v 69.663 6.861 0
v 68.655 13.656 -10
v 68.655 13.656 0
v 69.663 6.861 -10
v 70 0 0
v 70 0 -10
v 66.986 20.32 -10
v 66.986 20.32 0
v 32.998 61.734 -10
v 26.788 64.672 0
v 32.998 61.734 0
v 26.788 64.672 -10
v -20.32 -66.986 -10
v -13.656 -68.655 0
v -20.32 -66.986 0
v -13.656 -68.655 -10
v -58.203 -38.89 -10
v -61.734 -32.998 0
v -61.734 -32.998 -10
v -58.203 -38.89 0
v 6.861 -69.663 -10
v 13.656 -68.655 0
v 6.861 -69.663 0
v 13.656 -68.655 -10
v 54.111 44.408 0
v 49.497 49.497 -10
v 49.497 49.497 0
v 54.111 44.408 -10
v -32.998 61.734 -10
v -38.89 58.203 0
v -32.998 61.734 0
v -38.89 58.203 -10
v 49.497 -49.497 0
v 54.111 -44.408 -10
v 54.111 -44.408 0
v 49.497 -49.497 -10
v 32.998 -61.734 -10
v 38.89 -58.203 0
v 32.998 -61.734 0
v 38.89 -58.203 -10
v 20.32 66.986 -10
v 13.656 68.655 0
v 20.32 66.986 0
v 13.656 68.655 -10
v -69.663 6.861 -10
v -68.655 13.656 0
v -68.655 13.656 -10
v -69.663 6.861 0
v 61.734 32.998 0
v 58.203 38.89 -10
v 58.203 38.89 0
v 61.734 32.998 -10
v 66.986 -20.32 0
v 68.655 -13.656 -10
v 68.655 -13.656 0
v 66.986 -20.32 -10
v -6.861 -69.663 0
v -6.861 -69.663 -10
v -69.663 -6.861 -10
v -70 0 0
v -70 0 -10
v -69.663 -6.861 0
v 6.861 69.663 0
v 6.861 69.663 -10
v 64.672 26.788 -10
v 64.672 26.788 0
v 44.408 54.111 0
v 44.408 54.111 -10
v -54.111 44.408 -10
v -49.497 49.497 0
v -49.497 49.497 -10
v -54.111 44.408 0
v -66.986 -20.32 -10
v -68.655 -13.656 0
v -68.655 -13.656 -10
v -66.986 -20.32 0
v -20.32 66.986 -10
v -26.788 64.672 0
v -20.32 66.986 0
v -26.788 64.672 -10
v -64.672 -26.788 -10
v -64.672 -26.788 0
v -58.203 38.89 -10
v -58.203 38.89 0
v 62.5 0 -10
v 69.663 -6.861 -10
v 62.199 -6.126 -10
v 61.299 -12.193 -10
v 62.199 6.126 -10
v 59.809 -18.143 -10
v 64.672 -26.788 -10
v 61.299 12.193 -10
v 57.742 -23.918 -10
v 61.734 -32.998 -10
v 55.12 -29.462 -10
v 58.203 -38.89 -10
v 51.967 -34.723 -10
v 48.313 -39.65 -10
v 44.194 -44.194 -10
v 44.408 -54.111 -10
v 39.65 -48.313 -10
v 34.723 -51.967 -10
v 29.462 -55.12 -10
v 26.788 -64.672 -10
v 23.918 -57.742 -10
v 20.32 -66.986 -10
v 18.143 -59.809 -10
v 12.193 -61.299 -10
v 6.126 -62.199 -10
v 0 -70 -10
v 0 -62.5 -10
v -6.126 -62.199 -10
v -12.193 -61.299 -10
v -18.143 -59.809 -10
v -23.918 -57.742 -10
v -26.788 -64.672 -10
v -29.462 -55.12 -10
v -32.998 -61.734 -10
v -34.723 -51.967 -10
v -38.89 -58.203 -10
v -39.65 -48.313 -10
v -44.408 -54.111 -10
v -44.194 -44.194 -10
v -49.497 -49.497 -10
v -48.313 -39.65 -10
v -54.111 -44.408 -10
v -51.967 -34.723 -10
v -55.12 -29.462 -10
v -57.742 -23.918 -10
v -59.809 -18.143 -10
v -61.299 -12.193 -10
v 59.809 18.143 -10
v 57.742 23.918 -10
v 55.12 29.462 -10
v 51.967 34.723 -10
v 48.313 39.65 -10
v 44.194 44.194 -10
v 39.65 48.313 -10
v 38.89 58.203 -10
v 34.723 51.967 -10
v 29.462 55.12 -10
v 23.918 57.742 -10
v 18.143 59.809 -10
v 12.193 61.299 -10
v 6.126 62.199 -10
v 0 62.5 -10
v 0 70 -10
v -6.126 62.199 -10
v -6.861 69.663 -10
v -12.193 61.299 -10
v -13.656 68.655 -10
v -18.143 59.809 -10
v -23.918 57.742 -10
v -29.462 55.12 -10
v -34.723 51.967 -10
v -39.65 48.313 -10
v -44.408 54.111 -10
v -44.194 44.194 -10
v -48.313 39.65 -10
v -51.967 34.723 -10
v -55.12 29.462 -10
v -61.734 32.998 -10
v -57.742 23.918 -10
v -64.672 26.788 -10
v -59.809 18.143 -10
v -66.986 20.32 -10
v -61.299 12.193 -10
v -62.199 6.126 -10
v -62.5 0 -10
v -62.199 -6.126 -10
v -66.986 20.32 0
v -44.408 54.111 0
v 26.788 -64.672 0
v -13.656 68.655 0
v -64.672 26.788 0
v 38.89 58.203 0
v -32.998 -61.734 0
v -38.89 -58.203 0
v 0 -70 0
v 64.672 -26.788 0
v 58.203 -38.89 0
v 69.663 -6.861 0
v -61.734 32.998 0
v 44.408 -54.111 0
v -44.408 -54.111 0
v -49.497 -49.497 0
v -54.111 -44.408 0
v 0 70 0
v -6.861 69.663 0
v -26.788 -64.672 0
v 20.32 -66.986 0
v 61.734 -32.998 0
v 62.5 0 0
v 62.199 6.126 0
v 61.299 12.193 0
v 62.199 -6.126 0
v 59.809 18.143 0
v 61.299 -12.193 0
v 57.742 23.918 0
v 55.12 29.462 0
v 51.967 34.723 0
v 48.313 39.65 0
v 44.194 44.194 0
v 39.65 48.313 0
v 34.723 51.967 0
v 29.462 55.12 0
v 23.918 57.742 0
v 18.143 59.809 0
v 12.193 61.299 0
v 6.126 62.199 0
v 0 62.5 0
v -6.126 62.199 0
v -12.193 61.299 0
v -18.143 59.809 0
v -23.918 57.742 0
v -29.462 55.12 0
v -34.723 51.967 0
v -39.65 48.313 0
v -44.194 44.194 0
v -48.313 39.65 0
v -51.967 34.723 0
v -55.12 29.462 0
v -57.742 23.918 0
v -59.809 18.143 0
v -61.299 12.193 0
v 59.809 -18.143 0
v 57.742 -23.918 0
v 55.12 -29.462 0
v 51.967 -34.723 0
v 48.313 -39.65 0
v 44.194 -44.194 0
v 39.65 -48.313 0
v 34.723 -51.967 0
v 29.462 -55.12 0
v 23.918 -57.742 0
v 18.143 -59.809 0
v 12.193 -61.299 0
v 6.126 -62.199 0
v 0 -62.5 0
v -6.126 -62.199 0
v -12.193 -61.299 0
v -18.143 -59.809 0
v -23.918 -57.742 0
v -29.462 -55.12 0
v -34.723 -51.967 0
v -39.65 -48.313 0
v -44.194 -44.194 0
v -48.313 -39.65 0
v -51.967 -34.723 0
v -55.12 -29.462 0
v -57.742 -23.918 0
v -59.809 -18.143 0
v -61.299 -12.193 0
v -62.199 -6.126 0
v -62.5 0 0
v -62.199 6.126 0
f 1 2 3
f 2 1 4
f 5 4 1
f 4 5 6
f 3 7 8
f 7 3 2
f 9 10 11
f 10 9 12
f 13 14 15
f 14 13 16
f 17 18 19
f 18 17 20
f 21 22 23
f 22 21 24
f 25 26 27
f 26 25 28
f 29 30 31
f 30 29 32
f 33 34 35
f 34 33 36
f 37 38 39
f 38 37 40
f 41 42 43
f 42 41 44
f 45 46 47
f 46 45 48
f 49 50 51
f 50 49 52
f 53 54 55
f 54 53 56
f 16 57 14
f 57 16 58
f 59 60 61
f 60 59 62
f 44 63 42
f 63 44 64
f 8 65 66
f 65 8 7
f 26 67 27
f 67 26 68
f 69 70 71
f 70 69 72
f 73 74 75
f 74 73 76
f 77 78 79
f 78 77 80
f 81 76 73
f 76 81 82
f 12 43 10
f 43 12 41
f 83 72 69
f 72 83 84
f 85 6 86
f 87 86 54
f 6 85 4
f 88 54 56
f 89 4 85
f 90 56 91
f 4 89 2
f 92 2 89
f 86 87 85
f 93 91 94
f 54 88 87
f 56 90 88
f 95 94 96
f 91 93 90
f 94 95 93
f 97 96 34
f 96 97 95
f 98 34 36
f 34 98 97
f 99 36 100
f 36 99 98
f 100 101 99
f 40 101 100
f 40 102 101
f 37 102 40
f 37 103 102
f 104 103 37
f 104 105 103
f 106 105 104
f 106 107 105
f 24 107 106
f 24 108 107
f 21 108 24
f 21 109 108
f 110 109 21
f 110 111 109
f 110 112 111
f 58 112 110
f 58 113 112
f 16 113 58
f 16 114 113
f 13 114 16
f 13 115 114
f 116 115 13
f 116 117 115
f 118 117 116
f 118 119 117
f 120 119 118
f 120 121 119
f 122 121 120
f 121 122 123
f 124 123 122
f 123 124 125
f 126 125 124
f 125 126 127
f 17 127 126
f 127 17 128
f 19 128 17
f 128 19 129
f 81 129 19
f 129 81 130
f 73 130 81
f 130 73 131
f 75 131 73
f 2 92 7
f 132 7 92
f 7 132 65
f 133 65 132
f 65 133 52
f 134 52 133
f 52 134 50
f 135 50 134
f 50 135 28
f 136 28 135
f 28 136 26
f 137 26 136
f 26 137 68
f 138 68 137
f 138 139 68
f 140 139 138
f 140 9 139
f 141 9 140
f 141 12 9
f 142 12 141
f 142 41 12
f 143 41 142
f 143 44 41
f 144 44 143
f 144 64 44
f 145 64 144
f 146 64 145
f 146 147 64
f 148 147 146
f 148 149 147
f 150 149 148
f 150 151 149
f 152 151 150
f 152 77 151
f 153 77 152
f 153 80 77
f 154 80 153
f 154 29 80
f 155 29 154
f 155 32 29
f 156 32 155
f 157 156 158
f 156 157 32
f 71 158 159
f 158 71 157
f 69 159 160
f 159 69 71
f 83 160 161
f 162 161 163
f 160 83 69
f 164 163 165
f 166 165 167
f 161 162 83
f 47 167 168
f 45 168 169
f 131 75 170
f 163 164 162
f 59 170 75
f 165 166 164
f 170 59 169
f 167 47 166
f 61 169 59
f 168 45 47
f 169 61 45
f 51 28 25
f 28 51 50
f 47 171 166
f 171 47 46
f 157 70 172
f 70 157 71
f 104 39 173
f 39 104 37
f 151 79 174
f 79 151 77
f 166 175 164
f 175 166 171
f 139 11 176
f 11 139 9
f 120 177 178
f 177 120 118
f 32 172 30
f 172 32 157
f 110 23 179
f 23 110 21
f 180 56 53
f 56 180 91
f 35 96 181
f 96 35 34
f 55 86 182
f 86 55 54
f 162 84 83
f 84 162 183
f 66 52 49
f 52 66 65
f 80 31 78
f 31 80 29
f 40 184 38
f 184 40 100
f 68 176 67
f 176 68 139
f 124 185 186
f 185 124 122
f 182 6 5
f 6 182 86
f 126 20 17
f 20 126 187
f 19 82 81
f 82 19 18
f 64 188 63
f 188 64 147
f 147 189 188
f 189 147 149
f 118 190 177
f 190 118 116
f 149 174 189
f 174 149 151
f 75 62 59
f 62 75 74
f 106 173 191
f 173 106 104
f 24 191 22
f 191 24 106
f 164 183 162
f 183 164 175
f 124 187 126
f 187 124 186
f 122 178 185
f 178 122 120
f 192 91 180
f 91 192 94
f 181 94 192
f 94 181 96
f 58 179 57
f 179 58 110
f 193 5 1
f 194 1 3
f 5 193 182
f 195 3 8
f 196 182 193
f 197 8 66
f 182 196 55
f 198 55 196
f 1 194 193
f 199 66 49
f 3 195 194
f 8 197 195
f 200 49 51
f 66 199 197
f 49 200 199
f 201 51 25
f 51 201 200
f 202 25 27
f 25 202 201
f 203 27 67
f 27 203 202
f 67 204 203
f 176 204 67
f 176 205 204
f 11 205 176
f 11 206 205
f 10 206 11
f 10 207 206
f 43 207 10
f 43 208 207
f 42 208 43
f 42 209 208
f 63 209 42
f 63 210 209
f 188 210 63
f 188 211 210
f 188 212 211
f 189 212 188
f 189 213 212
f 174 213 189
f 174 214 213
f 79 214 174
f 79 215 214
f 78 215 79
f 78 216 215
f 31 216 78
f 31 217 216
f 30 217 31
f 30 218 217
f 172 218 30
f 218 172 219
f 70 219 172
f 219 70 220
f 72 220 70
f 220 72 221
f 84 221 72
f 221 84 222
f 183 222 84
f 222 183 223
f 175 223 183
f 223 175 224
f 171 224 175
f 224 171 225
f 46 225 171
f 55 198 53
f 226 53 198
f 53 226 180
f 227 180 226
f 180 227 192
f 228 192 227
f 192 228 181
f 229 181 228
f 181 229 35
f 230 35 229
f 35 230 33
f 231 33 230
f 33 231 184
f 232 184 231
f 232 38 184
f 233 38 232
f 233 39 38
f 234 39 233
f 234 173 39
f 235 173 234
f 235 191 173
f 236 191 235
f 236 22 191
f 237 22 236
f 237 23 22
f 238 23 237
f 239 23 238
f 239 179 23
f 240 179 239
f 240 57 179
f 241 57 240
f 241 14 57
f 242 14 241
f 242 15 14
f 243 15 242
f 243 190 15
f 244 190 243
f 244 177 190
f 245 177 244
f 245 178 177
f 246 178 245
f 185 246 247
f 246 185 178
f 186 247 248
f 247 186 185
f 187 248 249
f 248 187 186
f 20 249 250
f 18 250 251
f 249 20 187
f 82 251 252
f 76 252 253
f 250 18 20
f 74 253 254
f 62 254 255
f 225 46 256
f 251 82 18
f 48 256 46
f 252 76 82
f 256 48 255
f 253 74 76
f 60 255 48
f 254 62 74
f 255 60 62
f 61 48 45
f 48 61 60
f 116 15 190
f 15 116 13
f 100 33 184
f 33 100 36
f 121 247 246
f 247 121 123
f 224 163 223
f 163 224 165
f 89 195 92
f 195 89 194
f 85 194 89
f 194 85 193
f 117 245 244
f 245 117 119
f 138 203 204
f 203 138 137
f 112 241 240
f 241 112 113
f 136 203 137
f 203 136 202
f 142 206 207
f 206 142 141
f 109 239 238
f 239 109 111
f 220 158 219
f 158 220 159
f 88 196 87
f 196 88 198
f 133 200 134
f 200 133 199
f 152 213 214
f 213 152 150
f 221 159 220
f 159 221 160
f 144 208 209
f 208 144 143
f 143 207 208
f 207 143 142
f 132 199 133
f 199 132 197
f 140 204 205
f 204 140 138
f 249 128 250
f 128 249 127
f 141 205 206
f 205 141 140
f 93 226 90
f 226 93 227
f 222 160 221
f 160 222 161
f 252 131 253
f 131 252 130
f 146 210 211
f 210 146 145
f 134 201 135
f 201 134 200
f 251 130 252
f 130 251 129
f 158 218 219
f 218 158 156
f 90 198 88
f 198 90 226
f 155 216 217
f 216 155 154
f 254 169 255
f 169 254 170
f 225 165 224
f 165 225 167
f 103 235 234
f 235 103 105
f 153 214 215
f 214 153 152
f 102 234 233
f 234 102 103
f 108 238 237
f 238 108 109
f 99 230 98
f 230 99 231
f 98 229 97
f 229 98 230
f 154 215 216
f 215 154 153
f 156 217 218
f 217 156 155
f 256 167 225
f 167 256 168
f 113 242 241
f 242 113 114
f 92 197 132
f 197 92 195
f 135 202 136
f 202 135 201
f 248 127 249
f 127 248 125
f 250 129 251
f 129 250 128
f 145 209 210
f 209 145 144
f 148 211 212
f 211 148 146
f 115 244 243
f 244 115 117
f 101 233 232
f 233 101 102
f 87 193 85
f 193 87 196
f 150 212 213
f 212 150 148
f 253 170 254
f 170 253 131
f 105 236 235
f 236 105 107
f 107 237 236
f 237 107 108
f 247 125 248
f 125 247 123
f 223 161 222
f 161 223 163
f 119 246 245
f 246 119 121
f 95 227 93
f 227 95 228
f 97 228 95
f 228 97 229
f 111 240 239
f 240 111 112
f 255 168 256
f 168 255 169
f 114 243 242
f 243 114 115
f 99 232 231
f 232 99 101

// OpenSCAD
// Generated by SolidPython 1.1.1 on 2022-02-24 00:10:44
$fn = 64;


translate(v = [0, 0, -10.0000000000]) {
	difference() {
		cylinder(h = 10.0000000000, r = 70.0000000000);
		translate(v = [0, 0, -0.0300000000]) {
			cylinder(h = 10.0600000000, r = 62.5000000000);
		}
	}
}
/***********************************************
*********      SolidPython code:      **********
************************************************
 
from solid import *
from solid.utils import *
import math

cm = 10
z = 0.03
fn = 64


def render(model, filename, fn=fn):
    scad_render_to_file(model, filename, file_header='$fn = %d;' % fn)


tube_radius = 13 * cm / 2
fan_outlet_radius = 12.5 * cm / 2

padding_r = 0.5 * cm
total_height = 2 * cm

fan_outlet = cylinder(
    tube_radius + padding_r, total_height / 2)
fan_outlet_hole = cylinder(fan_outlet_radius, total_height / 2 + z*2)
fan_outlet_hole = translate([0, 0, - z])(fan_outlet_hole)

tube = cylinder(
    tube_radius + padding_r, total_height / 2)
tube_hole = cylinder(tube_radius, total_height / 2 + z*2)
tube_hole = translate([0, 0, - z])(tube_hole)


fan_outlet_attachment = fan_outlet - fan_outlet_hole
fan_outlet_attachment = translate(
    [0, 0, -total_height / 2])(fan_outlet_attachment)

tube_attachment = tube - tube_hole


render(fan_outlet_attachment, "fan_outlet_attachment.scad")
render(tube_attachment, "tube_attachment.scad")
render(fan_outlet_attachment + tube_attachment, "combined.scad")
 
 
************************************************/
